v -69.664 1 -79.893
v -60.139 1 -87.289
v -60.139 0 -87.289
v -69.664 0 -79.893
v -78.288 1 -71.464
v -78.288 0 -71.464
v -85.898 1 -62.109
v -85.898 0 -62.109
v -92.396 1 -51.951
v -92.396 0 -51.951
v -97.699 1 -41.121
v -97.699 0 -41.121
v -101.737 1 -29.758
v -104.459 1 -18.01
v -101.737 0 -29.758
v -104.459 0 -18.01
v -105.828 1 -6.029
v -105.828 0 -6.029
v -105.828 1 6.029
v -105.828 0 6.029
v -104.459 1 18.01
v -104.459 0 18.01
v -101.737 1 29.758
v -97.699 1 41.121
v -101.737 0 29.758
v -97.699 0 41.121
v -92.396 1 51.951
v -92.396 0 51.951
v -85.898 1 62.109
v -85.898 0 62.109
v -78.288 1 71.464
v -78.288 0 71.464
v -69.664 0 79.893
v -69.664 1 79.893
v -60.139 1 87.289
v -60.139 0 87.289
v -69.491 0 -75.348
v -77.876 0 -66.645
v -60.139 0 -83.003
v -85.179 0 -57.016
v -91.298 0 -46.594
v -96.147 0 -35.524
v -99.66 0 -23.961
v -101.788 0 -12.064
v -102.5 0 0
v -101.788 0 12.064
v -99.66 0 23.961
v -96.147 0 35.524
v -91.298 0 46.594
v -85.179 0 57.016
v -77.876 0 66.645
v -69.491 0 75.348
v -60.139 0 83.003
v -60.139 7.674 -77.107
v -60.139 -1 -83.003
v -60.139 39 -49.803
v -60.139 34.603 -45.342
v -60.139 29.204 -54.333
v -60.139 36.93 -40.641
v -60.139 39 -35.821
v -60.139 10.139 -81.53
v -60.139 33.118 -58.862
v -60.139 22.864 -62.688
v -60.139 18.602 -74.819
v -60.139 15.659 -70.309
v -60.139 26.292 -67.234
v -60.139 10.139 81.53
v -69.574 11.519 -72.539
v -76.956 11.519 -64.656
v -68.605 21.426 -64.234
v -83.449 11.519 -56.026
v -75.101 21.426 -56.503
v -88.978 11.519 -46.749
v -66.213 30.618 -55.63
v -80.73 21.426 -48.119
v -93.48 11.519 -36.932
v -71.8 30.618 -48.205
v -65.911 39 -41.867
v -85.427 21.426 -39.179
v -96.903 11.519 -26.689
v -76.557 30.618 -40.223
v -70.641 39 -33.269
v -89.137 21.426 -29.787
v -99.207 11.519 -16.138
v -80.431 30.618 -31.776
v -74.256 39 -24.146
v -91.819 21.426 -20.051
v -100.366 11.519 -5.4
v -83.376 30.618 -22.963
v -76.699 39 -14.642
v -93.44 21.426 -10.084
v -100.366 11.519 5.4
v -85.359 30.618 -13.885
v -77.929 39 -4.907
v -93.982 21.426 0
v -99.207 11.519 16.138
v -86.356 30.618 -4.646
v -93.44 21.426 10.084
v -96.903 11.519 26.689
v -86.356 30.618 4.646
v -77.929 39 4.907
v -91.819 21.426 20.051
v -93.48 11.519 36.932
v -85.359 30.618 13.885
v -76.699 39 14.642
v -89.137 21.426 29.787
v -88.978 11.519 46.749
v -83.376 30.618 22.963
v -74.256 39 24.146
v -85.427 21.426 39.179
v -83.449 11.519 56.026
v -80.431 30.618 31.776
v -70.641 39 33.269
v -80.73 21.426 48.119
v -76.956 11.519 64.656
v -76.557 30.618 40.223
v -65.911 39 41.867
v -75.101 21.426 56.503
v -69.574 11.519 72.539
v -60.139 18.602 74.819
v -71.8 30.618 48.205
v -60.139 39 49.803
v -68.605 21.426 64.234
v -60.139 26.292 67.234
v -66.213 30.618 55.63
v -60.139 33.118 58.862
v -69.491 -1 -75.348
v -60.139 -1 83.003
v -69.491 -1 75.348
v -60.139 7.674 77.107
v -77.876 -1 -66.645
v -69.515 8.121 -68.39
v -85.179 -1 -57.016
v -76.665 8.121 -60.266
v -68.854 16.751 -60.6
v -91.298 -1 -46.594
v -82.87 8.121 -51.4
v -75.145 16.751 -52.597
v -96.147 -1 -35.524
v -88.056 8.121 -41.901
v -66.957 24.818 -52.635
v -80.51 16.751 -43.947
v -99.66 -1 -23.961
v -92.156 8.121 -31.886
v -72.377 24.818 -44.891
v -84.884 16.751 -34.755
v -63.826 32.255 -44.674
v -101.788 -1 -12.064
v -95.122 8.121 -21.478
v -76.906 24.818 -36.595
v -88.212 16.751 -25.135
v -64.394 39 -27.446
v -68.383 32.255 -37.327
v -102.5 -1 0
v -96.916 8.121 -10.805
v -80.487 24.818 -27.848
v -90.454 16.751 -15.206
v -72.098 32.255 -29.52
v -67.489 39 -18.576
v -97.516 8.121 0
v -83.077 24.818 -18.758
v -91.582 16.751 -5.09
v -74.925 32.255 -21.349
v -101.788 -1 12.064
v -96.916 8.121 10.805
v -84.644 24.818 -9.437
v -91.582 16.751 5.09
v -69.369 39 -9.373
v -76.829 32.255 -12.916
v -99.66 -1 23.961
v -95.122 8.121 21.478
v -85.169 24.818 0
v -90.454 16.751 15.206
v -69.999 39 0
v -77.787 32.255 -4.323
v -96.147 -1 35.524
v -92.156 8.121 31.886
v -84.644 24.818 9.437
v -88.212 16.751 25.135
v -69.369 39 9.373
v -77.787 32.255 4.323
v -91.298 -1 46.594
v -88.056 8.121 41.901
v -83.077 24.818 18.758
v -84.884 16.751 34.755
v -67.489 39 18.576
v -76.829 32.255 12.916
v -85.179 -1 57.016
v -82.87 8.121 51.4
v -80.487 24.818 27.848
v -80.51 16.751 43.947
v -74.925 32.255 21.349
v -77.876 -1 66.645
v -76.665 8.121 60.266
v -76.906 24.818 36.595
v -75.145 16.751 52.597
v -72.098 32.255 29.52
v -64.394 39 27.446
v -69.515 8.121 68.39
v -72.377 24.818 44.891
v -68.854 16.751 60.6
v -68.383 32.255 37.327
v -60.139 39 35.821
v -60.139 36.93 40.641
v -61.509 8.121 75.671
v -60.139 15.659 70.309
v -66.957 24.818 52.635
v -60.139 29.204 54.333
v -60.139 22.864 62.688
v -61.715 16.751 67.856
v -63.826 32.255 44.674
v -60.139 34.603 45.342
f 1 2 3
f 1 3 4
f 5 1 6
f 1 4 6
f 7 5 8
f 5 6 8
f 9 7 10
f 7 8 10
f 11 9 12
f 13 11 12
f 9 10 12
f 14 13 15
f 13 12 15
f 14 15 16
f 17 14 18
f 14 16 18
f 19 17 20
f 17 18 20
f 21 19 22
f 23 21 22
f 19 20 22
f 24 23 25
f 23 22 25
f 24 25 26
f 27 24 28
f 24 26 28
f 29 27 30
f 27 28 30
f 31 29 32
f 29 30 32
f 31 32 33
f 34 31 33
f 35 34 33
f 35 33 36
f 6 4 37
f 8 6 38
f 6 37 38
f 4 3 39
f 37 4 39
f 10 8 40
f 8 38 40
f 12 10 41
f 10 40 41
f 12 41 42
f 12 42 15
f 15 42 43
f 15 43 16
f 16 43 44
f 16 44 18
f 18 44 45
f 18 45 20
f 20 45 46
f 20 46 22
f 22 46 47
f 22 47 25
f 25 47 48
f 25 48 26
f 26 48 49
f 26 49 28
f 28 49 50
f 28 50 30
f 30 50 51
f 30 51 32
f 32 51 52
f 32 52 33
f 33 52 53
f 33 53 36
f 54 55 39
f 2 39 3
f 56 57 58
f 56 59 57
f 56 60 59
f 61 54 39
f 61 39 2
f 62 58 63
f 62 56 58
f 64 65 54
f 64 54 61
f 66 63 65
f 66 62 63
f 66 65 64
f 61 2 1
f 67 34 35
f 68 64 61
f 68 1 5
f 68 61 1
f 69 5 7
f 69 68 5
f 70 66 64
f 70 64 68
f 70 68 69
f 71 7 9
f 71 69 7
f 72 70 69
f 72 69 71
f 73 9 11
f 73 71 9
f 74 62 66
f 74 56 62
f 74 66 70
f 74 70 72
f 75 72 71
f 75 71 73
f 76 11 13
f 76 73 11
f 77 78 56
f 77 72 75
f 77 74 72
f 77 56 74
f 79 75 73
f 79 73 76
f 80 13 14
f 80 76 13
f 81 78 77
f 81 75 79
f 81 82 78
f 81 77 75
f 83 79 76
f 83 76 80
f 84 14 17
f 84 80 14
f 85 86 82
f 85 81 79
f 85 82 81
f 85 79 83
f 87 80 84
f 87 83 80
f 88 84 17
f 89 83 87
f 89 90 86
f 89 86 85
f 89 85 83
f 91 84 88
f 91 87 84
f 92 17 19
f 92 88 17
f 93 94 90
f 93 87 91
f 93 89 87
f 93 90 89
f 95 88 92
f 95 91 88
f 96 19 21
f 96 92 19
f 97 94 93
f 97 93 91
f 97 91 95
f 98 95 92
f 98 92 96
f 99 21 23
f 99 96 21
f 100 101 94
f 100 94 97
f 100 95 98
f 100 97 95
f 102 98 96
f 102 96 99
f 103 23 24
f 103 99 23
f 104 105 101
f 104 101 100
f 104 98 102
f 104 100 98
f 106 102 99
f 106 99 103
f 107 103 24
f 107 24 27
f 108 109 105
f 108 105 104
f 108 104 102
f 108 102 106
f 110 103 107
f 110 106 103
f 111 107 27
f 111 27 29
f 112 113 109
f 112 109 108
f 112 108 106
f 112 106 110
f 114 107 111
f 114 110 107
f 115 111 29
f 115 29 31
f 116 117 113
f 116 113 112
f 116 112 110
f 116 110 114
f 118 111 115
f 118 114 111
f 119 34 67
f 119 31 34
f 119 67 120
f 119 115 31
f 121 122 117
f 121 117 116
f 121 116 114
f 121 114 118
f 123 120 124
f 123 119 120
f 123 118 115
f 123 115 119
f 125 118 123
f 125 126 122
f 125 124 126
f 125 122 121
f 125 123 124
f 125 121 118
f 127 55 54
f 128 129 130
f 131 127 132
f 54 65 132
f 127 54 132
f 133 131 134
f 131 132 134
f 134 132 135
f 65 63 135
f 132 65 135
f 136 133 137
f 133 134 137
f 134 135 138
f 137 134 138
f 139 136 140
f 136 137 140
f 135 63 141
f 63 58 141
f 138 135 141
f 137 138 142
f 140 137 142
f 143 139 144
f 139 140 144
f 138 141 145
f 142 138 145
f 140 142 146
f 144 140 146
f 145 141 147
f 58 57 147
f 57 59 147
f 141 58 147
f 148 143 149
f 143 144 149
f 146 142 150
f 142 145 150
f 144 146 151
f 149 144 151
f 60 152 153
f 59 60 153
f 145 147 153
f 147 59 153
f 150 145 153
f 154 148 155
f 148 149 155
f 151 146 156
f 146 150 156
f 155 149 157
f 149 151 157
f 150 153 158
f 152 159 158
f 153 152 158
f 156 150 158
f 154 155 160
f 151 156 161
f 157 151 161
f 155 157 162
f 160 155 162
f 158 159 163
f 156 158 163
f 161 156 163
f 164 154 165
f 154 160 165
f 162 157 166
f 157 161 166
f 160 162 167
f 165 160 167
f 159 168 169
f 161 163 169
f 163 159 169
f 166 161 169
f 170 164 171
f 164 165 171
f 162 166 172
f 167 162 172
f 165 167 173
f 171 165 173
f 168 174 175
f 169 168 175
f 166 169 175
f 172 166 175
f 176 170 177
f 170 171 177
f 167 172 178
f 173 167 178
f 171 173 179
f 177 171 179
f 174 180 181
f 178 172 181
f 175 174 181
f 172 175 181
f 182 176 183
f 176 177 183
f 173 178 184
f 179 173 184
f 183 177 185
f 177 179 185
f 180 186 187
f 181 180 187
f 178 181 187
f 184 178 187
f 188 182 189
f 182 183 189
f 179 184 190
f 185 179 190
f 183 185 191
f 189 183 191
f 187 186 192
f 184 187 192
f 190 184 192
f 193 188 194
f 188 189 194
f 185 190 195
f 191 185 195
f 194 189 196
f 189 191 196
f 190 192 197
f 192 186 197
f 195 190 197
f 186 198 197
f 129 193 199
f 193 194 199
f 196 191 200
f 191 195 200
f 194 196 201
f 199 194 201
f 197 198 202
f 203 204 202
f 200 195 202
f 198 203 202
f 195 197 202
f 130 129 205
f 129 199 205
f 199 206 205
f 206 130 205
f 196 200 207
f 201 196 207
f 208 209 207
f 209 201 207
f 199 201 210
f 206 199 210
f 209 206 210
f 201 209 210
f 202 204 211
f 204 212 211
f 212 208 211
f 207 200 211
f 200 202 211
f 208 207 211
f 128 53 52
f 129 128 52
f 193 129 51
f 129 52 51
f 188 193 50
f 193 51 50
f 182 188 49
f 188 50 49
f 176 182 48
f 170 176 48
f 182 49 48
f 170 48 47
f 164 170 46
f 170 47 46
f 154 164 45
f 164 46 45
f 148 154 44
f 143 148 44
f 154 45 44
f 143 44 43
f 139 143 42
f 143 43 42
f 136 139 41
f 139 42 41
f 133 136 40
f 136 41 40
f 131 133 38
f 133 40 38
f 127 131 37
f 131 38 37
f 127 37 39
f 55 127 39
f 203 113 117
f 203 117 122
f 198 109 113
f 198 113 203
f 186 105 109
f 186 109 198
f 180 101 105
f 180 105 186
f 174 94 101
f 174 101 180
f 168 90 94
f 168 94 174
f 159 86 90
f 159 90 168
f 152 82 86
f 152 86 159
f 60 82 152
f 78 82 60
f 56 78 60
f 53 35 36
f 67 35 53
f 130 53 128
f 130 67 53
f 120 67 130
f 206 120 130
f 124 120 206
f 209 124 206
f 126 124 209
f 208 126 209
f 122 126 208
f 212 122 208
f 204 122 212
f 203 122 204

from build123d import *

# Parameters (mm, degrees)
SKETCH1_R           = 106
BOSS_EXTRUDE1_DEPTH = 1
DOME1_FACE_RADIUS   = 106
DOME1_HEIGHT        = 68
SKETCH3_R           = 102.5
BOSS_EXTRUDE2_DEPTH = 1
DOME3_FACE_RADIUS   = 102.5
DOME3_HEIGHT        = 64
SKETCH4_R           = 141.495239339
CUT_EXTRUDE1_DEPTH  = 30
SKETCH6_W           = 177.061938601
SKETCH6_H           = 266.714694693
CUT_EXTRUDE3_DEPTH  = 61


with BuildPart() as part:
    # Sketch1 → Boss-Extrude1 (new body)
    with BuildSketch(Plane(origin=(0, 0, 0), x_dir=(1, 0, 0), z_dir=(0, 1, 0))):
        with Locations(Location((0, 0, 0), (0, 0, 270))):
            Circle(SKETCH1_R)
    extrude(amount=BOSS_EXTRUDE1_DEPTH)

    # Dome1: a dome of height H over a round flat face of radius A is a cap of a sphere of radius (A * A + H * H) / (2 * H)
    dome1_r = (DOME1_FACE_RADIUS * DOME1_FACE_RADIUS + DOME1_HEIGHT * DOME1_HEIGHT) / (2 * DOME1_HEIGHT)
    dome1_base = Plane((0, 1, 0), z_dir=(0, 1, 0))
    with Locations(dome1_base.offset(DOME1_HEIGHT - dome1_r)):
        dome1_ball = Sphere(dome1_r, mode=Mode.PRIVATE)
    add(split(dome1_ball, bisect_by=dome1_base, keep=Keep.TOP, mode=Mode.PRIVATE))

    # Sketch3 → Boss-Extrude2 (add)
    with BuildSketch(Plane.XZ):
        with Locations(Location((0, 0, 0), (0, 0, 270))):
            Circle(SKETCH3_R)
    extrude(amount=BOSS_EXTRUDE2_DEPTH)

    # Dome3: a dome of height H over a round flat face of radius A is a cap of a sphere of radius (A * A + H * H) / (2 * H)
    dome3_r = (DOME3_FACE_RADIUS * DOME3_FACE_RADIUS + DOME3_HEIGHT * DOME3_HEIGHT) / (2 * DOME3_HEIGHT)
    dome3_base = Plane((0, -1, 0), z_dir=(0, 1, 0))
    with Locations(dome3_base.offset(DOME3_HEIGHT - dome3_r)):
        dome3_ball = Sphere(dome3_r, mode=Mode.PRIVATE)
    add(split(dome3_ball, bisect_by=dome3_base, keep=Keep.TOP, mode=Mode.PRIVATE), mode=Mode.SUBTRACT)

    # Sketch4 → Cut-Extrude1 (cut)
    with BuildSketch(Plane(origin=(0, 69, 0), x_dir=(1, 0, 0), z_dir=(0, 1, 0))):
        Circle(SKETCH4_R)
    extrude(amount=-CUT_EXTRUDE1_DEPTH, mode=Mode.SUBTRACT)

    # Sketch6 → Cut-Extrude3 (cut)
    with BuildSketch(Plane(origin=(0, 39, 0), x_dir=(1, 0, 0), z_dir=(0, 1, 0))):
        with Locations((28.391818017, 2.178811005)):
            Rectangle(SKETCH6_W, SKETCH6_H)
    extrude(amount=-CUT_EXTRUDE3_DEPTH, mode=Mode.SUBTRACT)


solid = part.part
